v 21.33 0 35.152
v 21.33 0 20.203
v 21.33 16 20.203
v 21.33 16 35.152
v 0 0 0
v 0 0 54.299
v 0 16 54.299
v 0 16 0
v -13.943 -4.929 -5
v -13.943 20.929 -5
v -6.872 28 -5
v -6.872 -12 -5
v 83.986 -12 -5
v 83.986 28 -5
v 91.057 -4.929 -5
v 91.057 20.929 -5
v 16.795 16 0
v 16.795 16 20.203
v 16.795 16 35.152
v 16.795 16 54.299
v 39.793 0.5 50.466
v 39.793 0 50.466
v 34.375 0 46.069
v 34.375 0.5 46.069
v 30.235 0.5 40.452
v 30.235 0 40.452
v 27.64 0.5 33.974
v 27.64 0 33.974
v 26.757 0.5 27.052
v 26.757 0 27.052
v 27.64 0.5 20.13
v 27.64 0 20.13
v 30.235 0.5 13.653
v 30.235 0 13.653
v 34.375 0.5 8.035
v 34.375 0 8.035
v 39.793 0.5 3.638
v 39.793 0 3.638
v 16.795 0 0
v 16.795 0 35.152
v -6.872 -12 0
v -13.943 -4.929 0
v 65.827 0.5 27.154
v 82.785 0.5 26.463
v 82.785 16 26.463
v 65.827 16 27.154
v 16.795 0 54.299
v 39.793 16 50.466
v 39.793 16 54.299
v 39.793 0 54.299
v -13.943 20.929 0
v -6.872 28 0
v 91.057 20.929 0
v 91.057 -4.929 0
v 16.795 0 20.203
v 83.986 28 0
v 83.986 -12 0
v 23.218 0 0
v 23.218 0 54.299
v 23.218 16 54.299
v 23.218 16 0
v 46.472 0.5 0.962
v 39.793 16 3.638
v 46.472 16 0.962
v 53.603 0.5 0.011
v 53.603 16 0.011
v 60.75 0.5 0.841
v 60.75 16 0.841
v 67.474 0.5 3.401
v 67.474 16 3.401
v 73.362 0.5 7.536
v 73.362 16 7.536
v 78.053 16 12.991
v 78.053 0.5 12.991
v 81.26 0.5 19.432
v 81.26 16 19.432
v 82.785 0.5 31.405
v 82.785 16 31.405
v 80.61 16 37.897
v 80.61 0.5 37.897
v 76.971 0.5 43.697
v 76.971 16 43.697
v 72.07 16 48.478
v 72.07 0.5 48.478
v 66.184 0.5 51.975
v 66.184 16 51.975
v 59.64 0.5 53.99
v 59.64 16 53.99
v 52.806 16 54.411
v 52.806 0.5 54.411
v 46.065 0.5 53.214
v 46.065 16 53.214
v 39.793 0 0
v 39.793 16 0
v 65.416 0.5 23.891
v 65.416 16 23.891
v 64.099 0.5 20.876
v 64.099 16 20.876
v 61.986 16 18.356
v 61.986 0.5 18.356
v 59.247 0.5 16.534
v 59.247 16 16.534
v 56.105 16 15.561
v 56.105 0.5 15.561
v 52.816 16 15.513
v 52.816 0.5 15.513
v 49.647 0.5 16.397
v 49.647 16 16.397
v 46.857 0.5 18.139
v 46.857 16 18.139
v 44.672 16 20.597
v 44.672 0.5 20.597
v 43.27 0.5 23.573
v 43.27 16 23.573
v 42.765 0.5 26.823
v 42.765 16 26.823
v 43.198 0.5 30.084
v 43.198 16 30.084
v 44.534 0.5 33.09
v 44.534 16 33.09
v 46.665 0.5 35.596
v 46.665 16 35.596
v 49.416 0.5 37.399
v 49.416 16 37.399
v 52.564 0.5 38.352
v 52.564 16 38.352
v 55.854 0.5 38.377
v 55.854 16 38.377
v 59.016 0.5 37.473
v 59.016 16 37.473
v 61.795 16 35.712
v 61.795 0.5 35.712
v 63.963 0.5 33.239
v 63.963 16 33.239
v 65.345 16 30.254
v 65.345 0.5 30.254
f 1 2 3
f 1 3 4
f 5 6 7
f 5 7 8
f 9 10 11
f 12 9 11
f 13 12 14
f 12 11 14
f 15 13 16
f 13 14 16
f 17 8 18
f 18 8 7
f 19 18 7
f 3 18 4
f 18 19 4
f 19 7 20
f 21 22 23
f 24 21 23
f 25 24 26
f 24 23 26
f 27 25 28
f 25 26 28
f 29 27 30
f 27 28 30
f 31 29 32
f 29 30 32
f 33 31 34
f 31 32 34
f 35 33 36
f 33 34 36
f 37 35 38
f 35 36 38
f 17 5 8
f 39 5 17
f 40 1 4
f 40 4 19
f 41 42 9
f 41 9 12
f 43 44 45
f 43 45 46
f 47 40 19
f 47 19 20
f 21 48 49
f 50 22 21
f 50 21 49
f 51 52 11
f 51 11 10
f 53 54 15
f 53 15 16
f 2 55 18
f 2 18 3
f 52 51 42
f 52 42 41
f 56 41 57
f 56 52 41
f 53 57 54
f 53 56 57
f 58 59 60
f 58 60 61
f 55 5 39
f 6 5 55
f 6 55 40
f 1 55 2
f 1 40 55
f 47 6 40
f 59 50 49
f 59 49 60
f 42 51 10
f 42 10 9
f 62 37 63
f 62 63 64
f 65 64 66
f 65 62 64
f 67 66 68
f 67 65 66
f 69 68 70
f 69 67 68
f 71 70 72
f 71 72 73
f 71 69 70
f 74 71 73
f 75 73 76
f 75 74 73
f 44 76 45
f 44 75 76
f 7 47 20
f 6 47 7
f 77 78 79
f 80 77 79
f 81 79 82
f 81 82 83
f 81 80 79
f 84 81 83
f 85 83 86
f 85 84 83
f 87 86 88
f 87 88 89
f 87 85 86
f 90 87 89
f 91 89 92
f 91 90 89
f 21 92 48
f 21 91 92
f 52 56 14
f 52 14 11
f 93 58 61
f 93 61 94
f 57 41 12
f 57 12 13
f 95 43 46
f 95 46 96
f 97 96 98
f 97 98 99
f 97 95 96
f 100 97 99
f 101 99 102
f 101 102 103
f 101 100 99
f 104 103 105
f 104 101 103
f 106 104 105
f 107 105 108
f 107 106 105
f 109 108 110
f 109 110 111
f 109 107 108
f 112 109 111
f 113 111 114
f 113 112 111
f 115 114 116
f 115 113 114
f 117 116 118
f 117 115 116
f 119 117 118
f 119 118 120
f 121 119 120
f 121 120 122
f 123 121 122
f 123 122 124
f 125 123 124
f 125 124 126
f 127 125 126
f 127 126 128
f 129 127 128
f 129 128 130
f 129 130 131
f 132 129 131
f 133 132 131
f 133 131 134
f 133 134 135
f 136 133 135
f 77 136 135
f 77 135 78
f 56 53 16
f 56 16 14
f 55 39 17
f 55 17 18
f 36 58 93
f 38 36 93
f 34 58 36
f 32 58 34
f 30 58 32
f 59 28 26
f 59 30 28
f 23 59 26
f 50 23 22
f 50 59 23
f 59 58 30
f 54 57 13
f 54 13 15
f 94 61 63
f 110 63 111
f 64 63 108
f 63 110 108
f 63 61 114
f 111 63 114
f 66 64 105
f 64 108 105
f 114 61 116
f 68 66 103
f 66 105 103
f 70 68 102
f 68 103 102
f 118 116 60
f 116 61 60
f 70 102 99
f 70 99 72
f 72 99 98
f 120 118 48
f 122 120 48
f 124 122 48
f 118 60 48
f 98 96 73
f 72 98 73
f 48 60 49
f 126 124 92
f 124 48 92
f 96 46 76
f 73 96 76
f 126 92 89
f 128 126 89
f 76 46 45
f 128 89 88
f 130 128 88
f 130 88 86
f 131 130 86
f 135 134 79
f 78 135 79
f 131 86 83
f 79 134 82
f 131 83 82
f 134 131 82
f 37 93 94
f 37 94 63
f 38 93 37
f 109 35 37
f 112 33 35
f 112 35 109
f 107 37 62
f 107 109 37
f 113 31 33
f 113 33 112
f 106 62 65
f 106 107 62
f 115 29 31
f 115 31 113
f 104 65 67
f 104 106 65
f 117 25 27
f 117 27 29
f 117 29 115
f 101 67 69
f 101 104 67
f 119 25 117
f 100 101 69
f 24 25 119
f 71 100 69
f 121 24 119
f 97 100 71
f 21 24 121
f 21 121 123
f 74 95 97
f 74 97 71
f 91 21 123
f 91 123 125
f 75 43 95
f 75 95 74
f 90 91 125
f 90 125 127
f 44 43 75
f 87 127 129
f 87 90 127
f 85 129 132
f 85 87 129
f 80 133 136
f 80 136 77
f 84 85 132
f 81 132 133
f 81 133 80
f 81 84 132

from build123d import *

# Parameters (mm, degrees)
F1_DEPTH = 16
F3_DEPTH = 5
F5_DEPTH = 0.5


with BuildPart() as f1:
    # F0 (on Front) → F1 (new body)
    with BuildSketch(Plane.XZ):
        Polygon((0, 54.299496), (0, 0), (16.794946, 0), (16.794946, 20.20259), (21.330208, 20.20259), (21.330208, 35.15172), (16.794946, 35.15172), (16.794946, 54.299496), align=None)
        with BuildLine():
            Line((39.793082, 54.299496), (23.217848, 54.299496))
            Line((23.217848, 54.299496), (23.217848, 0))
            Line((23.217848, 0), (39.793082, 0))
            Line((39.793082, 0), (39.793082, 3.637654))
            ThreePointArc((39.793082, 3.637654), (67.473593, 3.40141), (82.785092, 26.46273))
            Line((82.785092, 26.46273), (65.827004, 27.154222))
            ThreePointArc((65.827004, 27.154222), (42.90069, 25.180149), (65.34548, 30.254027))
            Line((65.34548, 30.254027), (82.785092, 31.404957))
            ThreePointArc((82.785092, 31.404957), (66.183523, 51.974798), (39.793082, 50.46647))
            Line((39.793082, 50.46647), (39.793082, 54.299496))
        make_face()
    extrude(amount=-F1_DEPTH)

    # F4 (on face) → F5 (cut)
    with BuildSketch(Plane.XZ):
        with BuildLine():
            ThreePointArc((65.827004, 27.154222), (42.90069, 25.180149), (65.34548, 30.254027))
            Line((65.34548, 30.254027), (82.785092, 31.404957))
            ThreePointArc((82.785092, 31.404957), (66.183523, 51.974798), (39.793082, 50.46647))
            ThreePointArc((39.793082, 50.46647), (26.756525, 27.052062), (39.793082, 3.637654))
            ThreePointArc((39.793082, 3.637654), (67.473593, 3.40141), (82.785092, 26.46273))
            Line((82.785092, 26.46273), (65.827004, 27.154222))
        make_face()
    extrude(amount=-F5_DEPTH, mode=Mode.SUBTRACT)


with BuildPart() as f3:
    # F2 (on Top) → F3 (new body)
    with BuildSketch(Plane.XY):
        Polygon((83.985612, 28), (-6.872252, 28), (-13.94332, 20.928932), (-13.94332, -4.928932), (-6.872252, -12), (83.985612, -12), (91.05668, -4.928932), (91.05668, 20.928932), align=None)
    extrude(amount=-F3_DEPTH)


solid = Compound([f1.part, f3.part])
